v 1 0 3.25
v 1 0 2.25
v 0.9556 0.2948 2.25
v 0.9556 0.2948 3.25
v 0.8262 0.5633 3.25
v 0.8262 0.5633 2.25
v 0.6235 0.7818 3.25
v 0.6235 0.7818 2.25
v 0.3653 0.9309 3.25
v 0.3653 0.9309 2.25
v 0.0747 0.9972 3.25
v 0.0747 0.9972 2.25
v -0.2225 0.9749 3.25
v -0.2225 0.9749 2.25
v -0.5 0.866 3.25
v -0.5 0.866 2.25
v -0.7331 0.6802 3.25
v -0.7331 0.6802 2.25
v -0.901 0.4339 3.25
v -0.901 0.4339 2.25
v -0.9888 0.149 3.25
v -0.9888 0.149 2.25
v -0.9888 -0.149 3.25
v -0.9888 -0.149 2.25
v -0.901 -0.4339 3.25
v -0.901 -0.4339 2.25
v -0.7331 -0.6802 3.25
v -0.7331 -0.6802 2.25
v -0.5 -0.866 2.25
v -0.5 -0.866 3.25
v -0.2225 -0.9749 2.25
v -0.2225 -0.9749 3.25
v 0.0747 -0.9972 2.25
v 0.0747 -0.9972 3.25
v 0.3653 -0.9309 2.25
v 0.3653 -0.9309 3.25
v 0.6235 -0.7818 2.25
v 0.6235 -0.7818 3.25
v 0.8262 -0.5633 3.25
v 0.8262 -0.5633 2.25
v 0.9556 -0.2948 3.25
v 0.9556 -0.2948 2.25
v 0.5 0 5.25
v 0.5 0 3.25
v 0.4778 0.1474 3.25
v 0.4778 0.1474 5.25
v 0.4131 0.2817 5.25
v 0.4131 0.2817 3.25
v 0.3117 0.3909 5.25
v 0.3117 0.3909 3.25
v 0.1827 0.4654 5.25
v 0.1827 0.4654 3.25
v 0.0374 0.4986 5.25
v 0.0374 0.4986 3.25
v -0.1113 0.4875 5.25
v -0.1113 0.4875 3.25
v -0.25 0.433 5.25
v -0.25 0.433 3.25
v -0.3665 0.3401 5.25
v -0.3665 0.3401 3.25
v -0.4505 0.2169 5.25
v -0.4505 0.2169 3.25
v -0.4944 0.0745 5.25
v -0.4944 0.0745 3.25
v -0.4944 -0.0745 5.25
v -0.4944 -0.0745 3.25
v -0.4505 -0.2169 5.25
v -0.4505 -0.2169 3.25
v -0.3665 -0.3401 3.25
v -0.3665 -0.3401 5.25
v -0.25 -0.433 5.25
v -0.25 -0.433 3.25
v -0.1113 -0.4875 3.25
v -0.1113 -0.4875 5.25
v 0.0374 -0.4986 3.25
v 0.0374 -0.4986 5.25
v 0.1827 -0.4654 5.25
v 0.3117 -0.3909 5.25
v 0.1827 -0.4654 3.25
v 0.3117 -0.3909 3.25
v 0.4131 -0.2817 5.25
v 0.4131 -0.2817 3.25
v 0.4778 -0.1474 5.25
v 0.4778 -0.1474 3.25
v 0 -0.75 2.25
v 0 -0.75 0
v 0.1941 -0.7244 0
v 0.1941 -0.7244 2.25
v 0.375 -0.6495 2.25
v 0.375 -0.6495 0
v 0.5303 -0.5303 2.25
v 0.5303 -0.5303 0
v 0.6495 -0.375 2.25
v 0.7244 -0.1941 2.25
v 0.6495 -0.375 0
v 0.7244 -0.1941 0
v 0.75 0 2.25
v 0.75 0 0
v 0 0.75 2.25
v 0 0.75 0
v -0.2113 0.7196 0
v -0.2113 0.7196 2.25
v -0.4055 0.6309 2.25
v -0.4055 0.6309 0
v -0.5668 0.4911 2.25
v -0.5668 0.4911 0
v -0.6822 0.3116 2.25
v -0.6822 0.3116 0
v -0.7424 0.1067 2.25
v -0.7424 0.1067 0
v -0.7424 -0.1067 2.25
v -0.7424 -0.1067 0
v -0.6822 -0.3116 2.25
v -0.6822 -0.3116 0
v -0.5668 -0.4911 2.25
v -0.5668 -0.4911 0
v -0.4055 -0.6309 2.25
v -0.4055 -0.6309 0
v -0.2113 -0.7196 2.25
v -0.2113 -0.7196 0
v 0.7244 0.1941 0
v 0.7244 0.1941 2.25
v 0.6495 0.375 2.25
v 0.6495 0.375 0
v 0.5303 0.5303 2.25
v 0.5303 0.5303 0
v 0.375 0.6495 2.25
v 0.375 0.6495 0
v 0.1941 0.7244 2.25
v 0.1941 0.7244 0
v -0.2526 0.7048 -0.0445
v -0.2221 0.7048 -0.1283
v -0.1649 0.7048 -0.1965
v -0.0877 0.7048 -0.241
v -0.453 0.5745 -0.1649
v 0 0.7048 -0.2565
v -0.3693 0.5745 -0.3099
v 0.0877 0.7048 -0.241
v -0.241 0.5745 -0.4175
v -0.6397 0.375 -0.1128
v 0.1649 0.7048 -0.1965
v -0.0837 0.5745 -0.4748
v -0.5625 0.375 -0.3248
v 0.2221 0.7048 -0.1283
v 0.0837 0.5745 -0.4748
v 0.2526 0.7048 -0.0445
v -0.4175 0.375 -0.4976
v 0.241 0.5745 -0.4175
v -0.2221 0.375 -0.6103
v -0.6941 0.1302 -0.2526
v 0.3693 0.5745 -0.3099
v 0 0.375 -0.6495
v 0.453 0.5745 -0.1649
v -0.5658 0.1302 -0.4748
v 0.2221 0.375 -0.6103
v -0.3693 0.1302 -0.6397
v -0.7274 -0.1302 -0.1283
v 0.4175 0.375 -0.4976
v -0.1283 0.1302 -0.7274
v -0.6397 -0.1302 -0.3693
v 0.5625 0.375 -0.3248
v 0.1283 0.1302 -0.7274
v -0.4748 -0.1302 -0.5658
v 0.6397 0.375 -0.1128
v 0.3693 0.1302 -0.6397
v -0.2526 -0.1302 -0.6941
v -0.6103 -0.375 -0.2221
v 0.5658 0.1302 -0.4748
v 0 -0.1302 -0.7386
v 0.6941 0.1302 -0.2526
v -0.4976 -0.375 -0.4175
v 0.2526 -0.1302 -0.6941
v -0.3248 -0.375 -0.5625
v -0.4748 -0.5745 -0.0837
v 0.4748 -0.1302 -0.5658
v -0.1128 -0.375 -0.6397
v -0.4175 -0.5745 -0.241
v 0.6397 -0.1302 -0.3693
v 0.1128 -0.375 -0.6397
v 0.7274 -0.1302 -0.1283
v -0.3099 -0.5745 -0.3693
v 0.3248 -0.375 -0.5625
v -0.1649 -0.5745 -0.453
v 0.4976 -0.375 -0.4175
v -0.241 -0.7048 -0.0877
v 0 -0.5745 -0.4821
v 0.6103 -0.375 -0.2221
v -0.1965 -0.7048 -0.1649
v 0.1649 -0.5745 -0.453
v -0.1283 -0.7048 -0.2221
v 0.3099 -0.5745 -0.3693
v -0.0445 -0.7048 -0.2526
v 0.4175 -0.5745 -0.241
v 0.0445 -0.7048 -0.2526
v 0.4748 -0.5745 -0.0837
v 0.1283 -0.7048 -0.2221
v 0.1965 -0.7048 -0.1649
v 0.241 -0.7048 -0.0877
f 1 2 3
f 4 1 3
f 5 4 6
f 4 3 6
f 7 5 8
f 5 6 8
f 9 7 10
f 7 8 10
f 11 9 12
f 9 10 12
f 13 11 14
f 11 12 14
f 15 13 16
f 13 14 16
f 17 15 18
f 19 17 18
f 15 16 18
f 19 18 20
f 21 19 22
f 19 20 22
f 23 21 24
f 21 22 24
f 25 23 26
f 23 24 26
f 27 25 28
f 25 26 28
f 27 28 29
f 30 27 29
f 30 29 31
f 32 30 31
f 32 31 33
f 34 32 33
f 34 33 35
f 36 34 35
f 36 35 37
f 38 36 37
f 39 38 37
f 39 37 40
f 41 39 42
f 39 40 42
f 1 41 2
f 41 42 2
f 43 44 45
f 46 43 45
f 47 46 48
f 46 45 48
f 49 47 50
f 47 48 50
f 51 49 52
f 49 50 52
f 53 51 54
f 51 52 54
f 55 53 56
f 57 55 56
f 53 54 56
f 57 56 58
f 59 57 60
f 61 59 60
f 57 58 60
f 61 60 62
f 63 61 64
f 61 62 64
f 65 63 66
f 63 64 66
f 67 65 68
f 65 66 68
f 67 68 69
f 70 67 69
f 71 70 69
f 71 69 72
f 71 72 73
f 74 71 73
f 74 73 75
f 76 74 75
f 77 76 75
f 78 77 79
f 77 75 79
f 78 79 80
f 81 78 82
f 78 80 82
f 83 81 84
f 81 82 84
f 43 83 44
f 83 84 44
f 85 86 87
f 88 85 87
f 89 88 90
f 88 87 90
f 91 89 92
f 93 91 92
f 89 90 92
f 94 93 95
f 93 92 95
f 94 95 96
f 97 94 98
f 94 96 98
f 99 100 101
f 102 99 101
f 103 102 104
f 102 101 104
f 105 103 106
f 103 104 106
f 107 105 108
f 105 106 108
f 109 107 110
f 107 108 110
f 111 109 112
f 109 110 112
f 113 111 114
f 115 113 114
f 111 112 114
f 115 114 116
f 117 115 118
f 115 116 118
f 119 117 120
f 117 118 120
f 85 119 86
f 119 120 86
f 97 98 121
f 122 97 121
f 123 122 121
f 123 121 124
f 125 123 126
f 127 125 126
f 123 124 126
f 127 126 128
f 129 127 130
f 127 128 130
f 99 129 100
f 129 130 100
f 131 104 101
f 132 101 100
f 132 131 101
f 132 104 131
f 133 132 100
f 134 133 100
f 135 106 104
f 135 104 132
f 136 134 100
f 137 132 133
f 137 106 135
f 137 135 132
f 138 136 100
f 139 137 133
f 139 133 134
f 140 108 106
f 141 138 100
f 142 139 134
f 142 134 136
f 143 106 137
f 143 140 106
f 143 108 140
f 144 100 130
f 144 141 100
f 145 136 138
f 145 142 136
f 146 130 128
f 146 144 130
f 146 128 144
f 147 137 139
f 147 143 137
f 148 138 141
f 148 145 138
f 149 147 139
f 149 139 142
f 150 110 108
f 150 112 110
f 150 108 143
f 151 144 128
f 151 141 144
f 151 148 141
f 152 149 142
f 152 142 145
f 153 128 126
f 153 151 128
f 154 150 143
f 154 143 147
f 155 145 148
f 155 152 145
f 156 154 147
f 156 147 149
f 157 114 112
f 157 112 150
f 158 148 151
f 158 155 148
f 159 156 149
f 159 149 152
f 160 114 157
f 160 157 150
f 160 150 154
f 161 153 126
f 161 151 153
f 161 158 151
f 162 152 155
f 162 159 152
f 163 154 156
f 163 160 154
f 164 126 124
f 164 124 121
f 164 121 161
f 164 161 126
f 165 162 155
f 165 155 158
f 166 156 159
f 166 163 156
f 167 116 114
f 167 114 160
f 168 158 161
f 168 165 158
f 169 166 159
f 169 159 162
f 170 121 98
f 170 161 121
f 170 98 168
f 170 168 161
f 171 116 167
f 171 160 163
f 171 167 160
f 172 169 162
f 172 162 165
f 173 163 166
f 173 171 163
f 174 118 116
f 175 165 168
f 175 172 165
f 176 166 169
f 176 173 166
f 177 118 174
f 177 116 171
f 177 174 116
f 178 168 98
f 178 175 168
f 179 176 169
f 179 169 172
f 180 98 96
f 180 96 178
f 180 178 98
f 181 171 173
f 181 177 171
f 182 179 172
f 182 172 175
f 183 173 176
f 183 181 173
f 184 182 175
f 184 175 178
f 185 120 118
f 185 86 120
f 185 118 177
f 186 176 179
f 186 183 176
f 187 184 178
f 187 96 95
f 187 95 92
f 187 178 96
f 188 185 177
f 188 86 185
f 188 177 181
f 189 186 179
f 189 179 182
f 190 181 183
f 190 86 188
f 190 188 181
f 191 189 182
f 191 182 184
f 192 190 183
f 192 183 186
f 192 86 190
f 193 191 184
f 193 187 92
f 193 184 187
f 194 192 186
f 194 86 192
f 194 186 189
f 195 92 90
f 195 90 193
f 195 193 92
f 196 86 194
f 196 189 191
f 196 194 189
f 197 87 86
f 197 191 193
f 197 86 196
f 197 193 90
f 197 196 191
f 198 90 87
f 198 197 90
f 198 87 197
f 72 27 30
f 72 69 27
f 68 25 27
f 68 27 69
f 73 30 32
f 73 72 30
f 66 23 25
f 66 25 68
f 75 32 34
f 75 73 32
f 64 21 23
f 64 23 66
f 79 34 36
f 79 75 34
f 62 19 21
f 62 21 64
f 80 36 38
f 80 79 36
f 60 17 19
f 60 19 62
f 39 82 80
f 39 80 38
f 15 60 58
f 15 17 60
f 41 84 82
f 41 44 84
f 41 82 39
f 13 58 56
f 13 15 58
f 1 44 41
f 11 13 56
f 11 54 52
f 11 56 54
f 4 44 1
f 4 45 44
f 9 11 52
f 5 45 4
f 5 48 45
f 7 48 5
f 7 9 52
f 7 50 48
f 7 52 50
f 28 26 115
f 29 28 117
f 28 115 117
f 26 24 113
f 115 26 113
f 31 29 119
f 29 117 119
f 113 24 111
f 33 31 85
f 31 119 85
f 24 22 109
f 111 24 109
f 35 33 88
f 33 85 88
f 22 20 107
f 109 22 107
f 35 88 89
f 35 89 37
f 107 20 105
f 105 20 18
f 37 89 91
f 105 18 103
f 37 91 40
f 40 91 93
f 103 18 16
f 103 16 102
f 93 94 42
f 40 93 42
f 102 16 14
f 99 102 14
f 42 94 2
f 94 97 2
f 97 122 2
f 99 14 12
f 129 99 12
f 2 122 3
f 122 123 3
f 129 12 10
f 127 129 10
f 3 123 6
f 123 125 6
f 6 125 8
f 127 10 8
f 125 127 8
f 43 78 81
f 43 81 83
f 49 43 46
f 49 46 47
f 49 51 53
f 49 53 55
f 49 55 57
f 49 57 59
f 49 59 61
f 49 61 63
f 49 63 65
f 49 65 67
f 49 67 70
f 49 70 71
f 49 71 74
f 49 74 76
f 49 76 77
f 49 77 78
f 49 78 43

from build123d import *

# Parameters (mm, degrees)
F1_ANGLE = 180
F2_DEPTH = 2.25
F3_R     = 1
F4_DEPTH = 1
F5_R     = 0.5
F6_DEPTH = 2


with BuildPart() as f1:
    # F0 (on Top) → F1 (revolve)
    with BuildSketch(Plane.XY):
        with BuildLine():
            Line((0, -0.75), (0, 0.75))
            ThreePointArc((0, 0.75), (-0.75, 0), (0, -0.75))
        make_face()
    revolve(axis=Axis((0, 0, 0), (0, -1, 0)), revolution_arc=F1_ANGLE)

    # F0 (on Top) → F2 (join)
    with BuildSketch(Plane.XY):
        with BuildLine():
            ThreePointArc((0, -0.75), (0.53033, -0.53033), (0.75, 0))
            ThreePointArc((0.75, 0), (0.53033, 0.53033), (0, 0.75))
            Line((0, 0.75), (0, -0.75))
        make_face()
        with BuildLine():
            Line((0, -0.75), (0, 0.75))
            ThreePointArc((0, 0.75), (-0.75, 0), (0, -0.75))
        make_face()
    extrude(amount=F2_DEPTH)

    # F3 (on face) → F4 (join)
    with BuildSketch(Plane.XY.offset(2.25)):
        Circle(F3_R)
    extrude(amount=F4_DEPTH)

    # F5 (on face) → F6 (join)
    with BuildSketch(Plane.XY.offset(3.25)):
        Circle(F5_R)
    extrude(amount=F6_DEPTH)


solid = f1.part
